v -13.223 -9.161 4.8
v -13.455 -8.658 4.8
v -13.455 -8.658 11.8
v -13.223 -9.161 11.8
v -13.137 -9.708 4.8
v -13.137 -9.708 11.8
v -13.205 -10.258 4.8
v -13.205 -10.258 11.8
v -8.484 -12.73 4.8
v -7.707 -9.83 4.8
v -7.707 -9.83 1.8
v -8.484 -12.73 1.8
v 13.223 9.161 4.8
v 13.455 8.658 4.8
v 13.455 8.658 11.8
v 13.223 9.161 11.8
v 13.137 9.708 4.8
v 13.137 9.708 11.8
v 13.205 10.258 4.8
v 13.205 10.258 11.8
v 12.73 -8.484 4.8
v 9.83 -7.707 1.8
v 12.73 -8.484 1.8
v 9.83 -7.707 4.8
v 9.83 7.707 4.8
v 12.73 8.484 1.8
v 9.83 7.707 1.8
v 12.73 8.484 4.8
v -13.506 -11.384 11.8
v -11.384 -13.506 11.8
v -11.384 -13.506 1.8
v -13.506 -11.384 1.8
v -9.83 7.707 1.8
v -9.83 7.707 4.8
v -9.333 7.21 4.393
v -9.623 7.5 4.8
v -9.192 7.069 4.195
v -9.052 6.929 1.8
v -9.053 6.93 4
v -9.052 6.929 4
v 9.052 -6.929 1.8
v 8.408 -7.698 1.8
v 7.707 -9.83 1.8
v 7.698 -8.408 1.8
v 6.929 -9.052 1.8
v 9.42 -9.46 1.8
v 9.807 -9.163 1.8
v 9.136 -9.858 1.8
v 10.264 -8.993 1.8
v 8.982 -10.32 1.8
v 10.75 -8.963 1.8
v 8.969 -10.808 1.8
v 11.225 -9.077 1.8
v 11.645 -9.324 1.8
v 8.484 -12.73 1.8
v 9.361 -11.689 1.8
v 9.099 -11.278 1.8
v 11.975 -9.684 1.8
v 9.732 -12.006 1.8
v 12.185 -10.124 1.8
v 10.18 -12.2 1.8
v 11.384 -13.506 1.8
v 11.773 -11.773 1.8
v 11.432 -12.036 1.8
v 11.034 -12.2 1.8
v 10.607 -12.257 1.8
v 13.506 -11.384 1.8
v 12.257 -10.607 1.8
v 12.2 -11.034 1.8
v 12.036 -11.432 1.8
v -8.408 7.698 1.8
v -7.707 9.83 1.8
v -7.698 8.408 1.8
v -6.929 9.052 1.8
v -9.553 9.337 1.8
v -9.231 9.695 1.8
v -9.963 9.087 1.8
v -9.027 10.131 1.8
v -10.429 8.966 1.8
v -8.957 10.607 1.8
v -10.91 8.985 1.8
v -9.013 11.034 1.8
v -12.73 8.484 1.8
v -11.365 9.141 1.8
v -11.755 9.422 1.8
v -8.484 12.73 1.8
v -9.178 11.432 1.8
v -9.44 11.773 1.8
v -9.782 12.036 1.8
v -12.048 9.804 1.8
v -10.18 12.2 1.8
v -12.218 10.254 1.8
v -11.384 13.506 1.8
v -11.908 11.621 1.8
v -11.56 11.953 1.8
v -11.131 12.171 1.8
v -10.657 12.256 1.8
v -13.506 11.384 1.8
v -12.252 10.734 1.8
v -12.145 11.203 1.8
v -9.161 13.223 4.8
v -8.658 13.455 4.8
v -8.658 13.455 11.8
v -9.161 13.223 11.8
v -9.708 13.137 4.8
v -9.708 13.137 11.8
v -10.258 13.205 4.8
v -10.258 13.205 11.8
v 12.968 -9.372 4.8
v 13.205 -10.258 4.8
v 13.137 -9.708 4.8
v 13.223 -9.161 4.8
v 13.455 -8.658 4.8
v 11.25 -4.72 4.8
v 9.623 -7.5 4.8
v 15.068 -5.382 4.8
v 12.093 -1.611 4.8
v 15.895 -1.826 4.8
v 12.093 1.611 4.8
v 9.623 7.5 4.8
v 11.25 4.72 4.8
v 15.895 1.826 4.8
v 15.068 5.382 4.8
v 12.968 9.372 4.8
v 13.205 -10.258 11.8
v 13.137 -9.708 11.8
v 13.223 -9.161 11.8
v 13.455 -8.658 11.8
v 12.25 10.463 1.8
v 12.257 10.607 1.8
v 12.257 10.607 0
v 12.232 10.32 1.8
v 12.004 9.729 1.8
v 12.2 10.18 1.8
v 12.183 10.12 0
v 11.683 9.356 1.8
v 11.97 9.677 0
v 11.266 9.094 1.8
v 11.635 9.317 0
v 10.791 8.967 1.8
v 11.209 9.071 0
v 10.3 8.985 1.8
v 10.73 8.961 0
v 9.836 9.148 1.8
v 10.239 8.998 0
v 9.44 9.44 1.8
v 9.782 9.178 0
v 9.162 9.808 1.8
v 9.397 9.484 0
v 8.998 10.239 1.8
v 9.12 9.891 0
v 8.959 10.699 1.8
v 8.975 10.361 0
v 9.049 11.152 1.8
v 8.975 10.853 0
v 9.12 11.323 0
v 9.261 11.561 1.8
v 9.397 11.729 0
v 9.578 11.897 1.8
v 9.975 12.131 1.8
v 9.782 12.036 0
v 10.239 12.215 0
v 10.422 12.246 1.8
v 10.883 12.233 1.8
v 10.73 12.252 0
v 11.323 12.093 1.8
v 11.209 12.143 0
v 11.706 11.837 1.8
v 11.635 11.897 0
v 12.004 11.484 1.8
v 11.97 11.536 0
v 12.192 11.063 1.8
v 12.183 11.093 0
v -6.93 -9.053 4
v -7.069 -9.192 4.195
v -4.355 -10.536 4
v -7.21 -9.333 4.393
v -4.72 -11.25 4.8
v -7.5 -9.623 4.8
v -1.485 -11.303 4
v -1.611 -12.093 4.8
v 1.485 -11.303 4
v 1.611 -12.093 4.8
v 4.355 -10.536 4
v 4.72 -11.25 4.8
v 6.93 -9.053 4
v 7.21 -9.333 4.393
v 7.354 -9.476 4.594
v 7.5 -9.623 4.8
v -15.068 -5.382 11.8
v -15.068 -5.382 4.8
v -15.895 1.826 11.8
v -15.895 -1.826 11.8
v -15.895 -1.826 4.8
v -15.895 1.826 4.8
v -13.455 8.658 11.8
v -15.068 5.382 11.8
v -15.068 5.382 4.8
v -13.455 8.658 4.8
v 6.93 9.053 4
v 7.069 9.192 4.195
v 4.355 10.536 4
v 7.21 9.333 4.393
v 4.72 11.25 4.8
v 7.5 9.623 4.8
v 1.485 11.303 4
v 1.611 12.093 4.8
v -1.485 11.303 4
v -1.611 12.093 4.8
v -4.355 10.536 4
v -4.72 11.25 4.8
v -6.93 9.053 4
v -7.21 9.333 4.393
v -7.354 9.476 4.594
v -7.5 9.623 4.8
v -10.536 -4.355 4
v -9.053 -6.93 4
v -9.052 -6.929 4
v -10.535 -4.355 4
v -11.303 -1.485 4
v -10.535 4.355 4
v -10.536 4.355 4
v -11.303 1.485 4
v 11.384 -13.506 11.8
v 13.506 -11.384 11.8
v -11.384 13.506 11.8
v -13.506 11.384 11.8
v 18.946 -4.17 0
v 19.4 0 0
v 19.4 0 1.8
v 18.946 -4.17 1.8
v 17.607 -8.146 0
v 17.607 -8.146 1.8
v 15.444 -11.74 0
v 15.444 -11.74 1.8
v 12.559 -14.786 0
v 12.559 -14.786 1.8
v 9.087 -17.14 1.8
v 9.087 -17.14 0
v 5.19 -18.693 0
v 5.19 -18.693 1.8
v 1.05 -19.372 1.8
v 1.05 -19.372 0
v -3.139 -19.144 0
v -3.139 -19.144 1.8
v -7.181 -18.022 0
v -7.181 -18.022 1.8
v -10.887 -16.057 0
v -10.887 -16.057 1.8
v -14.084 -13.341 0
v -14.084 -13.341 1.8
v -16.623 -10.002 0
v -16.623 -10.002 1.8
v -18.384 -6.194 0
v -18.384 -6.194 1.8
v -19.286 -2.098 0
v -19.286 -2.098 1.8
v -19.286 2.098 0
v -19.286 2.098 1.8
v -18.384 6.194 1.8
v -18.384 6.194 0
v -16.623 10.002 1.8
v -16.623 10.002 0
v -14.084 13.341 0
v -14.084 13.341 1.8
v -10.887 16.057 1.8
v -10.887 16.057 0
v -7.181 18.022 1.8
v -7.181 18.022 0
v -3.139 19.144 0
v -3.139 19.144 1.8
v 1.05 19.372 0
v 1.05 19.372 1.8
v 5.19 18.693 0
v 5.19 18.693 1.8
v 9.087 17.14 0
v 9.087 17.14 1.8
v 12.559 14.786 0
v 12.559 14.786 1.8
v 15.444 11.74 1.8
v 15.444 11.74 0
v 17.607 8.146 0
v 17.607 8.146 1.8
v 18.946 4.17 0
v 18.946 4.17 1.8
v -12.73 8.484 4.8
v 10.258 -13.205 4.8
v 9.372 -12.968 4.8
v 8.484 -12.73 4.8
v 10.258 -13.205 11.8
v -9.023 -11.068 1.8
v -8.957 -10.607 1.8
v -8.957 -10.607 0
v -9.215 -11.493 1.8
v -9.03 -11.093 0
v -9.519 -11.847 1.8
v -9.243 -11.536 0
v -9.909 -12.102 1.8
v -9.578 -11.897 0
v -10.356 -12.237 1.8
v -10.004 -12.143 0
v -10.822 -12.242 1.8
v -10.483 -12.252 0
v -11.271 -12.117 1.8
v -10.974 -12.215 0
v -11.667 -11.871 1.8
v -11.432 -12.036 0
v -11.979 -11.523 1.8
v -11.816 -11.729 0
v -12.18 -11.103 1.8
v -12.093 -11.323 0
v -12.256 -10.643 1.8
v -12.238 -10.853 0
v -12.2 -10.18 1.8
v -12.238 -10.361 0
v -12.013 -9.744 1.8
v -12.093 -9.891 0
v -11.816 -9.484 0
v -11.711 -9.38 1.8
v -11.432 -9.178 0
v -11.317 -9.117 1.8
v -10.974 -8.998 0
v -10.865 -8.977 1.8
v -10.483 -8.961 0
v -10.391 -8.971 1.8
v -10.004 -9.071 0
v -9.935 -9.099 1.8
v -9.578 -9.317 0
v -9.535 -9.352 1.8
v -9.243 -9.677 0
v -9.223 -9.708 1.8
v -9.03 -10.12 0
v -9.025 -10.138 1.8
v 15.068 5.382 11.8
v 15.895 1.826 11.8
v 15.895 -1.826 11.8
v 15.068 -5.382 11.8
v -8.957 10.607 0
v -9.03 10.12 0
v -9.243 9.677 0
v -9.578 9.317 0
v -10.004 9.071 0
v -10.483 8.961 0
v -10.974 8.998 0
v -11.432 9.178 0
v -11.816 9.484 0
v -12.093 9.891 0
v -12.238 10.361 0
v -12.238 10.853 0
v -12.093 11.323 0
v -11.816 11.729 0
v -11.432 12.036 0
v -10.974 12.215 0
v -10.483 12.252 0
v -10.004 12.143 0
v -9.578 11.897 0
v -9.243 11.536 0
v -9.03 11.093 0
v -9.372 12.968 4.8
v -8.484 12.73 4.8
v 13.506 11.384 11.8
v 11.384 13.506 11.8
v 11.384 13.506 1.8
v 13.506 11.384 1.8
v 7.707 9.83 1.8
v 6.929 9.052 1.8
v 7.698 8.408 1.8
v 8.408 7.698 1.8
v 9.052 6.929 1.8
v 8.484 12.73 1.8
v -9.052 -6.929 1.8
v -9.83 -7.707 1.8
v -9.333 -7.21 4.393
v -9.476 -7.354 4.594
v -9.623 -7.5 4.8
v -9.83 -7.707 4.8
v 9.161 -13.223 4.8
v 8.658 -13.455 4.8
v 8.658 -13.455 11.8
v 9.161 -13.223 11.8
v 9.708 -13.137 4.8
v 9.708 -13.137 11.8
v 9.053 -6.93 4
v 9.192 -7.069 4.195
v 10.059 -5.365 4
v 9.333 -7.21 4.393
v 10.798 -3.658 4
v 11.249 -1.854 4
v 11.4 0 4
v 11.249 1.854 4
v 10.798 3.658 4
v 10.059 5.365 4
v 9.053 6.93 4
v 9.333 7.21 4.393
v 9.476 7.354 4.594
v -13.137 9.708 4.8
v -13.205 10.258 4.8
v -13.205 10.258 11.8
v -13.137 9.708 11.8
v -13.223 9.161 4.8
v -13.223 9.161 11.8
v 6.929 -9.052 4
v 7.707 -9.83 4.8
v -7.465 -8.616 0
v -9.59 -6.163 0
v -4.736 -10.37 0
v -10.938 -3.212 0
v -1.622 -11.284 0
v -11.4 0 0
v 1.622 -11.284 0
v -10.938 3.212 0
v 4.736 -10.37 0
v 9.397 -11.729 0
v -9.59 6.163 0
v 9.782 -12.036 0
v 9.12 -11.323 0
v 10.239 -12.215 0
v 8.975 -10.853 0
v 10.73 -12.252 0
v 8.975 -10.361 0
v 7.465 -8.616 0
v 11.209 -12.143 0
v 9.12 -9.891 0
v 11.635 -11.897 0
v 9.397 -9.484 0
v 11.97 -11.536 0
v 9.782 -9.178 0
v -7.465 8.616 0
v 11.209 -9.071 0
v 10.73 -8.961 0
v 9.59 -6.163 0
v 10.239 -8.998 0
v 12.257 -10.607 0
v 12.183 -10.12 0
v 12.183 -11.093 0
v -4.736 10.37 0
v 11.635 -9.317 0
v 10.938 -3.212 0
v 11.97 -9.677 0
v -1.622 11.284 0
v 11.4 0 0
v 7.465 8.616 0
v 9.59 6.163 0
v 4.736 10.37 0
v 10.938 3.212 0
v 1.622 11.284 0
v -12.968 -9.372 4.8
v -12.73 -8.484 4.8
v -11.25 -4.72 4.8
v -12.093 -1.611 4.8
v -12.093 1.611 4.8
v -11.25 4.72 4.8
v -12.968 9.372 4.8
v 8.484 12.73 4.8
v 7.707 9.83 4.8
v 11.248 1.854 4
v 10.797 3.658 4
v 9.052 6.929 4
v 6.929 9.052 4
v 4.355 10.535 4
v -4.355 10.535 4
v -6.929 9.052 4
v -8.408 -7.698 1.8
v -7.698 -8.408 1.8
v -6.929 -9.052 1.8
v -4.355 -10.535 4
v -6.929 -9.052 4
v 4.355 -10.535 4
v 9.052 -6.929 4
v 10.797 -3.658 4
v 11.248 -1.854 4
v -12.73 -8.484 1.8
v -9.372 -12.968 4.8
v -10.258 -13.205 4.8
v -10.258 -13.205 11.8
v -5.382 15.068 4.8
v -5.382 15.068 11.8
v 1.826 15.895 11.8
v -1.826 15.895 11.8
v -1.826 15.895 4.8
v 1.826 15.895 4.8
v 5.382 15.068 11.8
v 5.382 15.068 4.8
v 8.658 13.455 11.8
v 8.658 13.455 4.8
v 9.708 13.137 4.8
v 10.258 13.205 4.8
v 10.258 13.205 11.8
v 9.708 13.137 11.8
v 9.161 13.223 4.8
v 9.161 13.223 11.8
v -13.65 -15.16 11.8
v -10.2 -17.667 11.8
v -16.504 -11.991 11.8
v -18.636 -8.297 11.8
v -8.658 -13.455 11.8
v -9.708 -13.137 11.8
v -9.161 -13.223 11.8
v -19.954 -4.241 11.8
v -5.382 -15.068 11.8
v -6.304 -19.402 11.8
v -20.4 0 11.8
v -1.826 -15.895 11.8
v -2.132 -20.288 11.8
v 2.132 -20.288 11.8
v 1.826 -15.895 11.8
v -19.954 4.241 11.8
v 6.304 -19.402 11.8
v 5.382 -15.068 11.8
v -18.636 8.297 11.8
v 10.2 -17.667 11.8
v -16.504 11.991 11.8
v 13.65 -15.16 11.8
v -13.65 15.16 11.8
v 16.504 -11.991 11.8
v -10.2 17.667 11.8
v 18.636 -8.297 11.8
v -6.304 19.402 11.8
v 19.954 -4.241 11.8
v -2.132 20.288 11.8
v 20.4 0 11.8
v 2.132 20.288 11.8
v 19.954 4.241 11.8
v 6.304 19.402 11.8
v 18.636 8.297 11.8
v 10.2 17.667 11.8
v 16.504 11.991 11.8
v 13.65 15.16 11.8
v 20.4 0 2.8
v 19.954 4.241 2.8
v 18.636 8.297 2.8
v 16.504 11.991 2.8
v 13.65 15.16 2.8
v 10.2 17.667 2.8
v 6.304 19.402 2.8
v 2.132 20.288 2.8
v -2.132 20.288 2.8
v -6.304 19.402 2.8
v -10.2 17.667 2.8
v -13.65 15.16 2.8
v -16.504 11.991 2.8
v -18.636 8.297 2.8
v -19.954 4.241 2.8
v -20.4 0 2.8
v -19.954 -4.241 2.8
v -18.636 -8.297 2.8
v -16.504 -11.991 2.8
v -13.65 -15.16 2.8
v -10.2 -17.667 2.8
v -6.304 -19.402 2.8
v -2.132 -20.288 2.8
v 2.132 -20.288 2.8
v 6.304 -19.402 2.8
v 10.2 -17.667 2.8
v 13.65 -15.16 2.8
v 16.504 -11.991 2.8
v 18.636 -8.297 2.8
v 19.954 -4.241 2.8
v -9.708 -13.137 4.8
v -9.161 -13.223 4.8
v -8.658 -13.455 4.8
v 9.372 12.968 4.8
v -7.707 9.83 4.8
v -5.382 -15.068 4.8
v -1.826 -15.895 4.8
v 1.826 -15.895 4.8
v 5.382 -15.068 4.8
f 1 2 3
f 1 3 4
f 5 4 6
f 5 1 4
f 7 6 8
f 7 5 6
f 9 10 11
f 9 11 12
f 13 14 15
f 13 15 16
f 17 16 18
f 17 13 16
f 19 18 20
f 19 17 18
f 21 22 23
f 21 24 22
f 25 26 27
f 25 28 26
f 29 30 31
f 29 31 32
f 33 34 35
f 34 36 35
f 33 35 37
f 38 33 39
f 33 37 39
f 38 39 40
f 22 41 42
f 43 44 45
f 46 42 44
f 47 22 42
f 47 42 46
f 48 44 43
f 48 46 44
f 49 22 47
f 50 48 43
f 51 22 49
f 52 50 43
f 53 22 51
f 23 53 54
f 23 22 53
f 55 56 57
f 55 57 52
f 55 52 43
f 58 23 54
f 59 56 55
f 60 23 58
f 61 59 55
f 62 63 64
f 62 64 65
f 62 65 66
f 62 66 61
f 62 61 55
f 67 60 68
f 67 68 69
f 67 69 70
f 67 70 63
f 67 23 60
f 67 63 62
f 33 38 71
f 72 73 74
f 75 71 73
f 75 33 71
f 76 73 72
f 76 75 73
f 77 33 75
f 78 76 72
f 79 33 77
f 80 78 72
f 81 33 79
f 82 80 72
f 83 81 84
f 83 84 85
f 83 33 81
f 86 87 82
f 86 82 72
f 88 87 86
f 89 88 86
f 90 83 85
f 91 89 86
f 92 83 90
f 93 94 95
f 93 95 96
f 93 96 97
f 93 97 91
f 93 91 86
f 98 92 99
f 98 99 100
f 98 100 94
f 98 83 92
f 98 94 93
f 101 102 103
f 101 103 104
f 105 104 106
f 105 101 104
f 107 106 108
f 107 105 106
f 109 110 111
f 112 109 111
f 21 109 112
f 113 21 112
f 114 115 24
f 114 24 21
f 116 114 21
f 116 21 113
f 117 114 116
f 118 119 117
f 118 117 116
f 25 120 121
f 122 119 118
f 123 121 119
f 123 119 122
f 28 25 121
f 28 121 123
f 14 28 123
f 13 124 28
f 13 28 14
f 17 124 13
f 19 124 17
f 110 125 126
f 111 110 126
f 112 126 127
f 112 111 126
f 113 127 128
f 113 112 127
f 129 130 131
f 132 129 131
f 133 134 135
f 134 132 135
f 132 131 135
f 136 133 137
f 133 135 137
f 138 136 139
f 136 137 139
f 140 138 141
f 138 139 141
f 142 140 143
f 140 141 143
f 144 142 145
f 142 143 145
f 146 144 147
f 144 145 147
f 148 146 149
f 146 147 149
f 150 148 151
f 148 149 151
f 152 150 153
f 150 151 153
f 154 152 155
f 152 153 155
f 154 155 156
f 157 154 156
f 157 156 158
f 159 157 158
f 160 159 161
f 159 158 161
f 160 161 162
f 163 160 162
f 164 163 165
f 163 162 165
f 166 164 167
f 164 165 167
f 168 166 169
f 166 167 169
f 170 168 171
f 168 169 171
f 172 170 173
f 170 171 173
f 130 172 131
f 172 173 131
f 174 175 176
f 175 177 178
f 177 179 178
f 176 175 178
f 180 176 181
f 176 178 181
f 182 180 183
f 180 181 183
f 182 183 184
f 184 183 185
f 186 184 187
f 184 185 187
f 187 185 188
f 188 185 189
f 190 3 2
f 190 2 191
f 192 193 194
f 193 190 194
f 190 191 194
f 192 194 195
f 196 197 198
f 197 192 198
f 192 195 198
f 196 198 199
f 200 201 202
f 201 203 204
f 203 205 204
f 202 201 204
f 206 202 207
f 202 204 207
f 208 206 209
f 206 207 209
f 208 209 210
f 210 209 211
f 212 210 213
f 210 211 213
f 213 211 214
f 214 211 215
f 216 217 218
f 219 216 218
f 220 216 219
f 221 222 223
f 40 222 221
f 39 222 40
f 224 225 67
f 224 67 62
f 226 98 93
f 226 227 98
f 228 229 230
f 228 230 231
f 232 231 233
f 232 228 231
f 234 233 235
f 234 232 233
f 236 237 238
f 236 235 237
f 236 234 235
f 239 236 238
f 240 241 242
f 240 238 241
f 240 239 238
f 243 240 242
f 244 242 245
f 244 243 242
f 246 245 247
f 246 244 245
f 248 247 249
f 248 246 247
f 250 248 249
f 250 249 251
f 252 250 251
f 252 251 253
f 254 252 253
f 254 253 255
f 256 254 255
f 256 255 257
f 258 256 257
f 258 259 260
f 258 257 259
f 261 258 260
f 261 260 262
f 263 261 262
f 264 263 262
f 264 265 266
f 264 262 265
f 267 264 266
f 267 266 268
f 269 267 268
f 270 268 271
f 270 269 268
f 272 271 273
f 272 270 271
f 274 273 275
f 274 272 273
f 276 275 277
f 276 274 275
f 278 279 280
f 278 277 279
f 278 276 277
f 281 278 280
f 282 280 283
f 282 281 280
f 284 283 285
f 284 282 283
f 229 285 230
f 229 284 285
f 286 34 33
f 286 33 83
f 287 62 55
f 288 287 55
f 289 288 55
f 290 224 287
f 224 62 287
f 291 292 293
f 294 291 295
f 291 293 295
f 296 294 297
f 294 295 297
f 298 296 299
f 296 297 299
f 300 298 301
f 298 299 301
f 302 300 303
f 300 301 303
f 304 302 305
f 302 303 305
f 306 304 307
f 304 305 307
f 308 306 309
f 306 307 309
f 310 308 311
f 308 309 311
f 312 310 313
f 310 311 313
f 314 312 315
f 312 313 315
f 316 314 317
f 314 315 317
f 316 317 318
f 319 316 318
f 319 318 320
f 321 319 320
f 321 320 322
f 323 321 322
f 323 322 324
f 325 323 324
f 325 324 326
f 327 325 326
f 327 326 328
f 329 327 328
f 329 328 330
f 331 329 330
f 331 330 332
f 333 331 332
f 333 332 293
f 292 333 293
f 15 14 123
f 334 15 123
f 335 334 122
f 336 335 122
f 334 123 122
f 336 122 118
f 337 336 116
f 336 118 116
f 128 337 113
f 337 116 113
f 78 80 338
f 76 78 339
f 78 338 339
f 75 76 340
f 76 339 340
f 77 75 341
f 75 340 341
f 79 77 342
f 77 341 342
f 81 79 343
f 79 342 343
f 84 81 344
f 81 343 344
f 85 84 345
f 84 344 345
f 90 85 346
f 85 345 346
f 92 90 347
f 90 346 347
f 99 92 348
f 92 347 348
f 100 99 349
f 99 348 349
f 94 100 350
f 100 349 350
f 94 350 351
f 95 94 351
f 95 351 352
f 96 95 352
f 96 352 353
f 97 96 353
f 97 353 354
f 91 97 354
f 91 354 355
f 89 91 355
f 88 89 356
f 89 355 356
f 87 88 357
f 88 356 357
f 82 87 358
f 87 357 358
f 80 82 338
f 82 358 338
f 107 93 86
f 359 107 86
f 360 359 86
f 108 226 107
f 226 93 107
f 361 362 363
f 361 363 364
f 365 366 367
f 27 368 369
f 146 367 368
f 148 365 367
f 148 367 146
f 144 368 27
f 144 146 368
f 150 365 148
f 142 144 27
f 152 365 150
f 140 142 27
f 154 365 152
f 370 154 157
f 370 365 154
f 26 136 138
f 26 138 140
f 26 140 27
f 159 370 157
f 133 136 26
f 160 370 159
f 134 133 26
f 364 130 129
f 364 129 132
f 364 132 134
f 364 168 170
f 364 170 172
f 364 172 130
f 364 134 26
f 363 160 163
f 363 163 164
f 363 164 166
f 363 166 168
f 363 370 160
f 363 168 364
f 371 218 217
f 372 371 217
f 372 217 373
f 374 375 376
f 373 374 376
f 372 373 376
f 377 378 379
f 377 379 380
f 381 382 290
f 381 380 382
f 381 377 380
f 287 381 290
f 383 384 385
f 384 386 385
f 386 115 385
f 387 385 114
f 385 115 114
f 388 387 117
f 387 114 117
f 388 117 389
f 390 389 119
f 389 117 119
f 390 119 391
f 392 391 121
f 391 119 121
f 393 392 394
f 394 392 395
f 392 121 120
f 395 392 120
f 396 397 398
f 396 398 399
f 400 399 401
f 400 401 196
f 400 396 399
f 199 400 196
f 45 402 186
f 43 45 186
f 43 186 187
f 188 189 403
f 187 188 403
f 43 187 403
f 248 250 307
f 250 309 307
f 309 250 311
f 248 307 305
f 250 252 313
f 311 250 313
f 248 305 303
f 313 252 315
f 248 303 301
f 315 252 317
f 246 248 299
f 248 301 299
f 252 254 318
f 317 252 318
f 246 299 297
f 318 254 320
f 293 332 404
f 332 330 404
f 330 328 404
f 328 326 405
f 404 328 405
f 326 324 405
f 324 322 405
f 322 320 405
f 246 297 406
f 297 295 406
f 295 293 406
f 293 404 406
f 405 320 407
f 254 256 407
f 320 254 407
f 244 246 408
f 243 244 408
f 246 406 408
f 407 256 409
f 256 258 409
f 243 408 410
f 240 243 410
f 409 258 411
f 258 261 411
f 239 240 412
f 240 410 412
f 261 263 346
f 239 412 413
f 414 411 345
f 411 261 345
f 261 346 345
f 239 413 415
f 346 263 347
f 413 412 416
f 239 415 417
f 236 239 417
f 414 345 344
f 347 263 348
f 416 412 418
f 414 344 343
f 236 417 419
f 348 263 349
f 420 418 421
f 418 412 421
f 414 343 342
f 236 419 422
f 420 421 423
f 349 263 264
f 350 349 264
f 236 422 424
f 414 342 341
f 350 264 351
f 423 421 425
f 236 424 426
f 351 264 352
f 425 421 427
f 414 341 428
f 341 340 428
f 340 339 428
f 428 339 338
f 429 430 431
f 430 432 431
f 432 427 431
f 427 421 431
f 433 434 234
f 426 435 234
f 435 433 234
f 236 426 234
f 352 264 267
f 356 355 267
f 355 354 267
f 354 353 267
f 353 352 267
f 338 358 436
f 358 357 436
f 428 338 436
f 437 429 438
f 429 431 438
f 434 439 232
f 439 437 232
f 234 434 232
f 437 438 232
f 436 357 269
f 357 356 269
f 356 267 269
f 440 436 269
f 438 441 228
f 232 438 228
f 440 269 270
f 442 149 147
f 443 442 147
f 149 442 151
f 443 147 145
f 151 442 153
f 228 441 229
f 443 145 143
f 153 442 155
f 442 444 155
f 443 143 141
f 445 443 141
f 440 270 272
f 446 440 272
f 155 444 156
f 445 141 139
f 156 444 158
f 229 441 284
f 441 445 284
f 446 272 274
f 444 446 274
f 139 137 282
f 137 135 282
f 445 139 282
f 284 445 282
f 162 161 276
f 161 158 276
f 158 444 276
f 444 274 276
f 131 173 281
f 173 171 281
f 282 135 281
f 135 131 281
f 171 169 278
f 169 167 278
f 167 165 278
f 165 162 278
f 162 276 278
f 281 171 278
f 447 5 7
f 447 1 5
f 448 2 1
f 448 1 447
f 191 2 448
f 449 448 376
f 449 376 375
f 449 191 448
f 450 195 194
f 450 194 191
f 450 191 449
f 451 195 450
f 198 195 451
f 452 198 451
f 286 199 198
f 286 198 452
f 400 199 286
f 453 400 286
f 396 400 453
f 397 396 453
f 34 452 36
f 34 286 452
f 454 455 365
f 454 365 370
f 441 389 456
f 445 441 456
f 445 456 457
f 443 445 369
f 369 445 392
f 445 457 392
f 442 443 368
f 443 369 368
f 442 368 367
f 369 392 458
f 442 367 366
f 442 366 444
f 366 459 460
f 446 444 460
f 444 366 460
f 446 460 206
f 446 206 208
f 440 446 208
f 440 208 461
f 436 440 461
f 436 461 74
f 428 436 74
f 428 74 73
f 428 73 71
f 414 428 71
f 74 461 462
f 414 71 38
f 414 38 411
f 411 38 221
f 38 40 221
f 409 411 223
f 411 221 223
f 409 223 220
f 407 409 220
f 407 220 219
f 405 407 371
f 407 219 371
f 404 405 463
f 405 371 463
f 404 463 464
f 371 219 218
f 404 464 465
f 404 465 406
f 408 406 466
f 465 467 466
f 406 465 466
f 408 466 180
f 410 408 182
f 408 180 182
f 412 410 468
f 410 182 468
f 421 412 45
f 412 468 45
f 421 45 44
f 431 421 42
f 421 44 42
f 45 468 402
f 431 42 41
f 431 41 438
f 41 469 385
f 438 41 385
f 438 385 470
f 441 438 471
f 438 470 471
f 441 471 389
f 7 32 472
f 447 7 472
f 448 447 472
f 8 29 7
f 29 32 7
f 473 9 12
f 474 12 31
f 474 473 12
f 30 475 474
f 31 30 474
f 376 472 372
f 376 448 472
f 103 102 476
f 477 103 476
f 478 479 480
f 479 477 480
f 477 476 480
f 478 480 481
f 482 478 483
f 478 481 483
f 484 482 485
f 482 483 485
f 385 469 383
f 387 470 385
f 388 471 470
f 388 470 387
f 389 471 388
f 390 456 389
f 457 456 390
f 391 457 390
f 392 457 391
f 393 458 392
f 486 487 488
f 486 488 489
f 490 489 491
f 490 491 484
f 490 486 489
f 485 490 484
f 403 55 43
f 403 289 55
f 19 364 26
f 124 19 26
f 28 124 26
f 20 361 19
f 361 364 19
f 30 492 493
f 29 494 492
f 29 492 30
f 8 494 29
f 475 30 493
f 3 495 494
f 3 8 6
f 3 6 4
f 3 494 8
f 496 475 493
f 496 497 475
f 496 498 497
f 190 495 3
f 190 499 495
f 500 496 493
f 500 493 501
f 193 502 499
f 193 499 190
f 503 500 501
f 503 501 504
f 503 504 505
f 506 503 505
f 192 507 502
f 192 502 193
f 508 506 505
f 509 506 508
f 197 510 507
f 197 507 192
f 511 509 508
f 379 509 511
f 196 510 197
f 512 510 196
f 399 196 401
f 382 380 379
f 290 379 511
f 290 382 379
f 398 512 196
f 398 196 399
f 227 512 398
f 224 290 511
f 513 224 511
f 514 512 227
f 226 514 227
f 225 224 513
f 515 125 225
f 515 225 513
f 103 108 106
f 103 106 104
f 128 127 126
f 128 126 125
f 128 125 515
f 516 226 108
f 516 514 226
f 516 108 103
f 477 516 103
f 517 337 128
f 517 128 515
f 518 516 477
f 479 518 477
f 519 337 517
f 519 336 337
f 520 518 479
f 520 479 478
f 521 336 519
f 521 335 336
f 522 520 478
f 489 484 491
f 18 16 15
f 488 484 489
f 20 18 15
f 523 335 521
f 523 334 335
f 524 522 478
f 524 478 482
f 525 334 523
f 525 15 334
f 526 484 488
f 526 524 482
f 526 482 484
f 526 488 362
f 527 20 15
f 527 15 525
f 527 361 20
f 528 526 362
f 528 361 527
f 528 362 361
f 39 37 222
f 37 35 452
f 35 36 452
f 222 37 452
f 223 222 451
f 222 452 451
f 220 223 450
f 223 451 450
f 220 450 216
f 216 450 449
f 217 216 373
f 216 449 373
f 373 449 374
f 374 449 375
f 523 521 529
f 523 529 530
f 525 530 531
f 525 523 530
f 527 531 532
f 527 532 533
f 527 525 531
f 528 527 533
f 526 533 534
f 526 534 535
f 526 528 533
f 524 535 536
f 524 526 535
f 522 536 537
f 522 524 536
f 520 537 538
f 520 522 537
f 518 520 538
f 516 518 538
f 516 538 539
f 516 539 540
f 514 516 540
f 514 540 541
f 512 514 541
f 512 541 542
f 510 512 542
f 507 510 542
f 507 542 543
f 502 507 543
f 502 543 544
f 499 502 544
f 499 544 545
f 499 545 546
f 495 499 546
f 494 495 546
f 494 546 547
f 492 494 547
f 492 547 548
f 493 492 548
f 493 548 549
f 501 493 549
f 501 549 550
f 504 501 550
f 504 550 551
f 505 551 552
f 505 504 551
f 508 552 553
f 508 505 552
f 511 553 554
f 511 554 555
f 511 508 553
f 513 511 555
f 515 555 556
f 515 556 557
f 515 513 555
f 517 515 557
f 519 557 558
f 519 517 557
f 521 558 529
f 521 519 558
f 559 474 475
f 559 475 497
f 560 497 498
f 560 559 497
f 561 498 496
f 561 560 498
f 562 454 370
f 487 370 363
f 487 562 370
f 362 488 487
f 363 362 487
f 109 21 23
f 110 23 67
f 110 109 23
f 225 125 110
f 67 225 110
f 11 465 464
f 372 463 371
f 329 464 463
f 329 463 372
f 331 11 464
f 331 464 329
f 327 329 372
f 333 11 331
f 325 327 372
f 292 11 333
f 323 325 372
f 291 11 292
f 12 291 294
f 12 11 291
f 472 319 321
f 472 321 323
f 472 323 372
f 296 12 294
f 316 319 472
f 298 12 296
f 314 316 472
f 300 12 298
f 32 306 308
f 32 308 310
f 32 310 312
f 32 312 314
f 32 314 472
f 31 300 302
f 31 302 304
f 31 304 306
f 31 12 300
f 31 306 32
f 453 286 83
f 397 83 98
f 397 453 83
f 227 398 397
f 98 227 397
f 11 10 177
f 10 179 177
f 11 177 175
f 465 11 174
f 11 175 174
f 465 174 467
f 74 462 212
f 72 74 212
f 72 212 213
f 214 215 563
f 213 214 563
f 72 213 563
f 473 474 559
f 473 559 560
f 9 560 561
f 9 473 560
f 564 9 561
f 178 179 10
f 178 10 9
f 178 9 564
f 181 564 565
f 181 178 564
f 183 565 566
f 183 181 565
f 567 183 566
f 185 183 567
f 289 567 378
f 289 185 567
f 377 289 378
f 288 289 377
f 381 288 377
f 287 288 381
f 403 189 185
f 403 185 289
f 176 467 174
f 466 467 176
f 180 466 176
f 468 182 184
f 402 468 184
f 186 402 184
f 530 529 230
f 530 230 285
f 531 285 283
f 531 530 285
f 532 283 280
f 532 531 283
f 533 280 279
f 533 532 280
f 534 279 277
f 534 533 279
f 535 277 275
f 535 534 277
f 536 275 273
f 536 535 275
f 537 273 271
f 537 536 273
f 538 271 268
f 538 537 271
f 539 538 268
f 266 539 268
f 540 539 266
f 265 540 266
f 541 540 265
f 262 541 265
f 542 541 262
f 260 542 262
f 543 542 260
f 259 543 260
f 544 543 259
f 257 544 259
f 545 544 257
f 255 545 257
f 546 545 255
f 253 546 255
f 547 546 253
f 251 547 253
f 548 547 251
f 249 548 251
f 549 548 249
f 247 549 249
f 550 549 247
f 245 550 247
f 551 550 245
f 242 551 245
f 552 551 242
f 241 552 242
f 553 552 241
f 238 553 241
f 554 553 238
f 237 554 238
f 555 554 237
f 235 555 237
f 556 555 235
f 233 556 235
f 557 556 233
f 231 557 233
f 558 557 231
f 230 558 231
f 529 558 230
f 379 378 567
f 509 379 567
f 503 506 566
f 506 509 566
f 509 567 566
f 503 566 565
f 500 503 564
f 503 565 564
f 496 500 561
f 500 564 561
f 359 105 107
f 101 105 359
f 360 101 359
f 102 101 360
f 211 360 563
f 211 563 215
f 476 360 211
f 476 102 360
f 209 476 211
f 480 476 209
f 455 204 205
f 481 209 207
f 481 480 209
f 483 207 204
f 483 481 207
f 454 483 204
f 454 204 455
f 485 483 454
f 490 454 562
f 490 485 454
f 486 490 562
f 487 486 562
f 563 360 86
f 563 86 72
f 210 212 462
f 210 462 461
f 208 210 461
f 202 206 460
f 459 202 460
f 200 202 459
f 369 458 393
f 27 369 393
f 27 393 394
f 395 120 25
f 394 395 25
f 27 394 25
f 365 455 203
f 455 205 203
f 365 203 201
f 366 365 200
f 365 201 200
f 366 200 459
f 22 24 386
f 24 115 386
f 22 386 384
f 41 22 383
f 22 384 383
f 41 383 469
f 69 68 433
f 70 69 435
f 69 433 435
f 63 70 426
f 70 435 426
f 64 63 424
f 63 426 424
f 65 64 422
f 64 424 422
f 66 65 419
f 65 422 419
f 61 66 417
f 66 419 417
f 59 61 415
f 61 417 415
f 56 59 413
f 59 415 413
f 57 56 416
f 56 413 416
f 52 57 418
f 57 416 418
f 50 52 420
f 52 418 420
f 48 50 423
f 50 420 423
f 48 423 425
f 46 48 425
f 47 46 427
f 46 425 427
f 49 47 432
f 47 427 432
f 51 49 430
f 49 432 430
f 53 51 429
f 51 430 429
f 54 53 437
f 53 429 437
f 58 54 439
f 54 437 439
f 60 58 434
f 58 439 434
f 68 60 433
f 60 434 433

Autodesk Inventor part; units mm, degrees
ref_plane "YZ Plane" through (0, 0, 0) normal (1, 0, 0) x (0, 1, 0)
ref_plane "XZ Plane" through (0, 0, 0) normal (0, 1, 0) x (-1, 0, 0)
ref_plane "XY Plane" through (0, 0, 0) normal (0, 0, 1) x (1, 0, 0)
sketch "스케치1" plane through (0, 0, 0) normal (0, 0, 1) x (1, 0, 0)
  circle A0 centre (0, 0) radius 19.4
  circle A1 centre (10.6066, 10.6066) radius 1.65
  circle A2 centre (0, 0) radius 11
  circle A3 centre (-10.6066, 10.6066) radius 1.65
  circle A4 centre (-10.6066, -10.6066) radius 1.65
  circle A5 centre (10.6066, -10.6066) radius 1.65
  dimension "d1" = 22
  dimension "d5" = 360
extrude "돌출1" add sketch "스케치1" along normal blind 4.8
sketch "스케치2" plane through (0, 0, 4.8) normal (0, 0, 1) x (1, 0, 0)
  circle A0 centre (0, 0) radius 19.4 projected
  circle A1 centre (10.6066, -10.6066) radius 1.65 projected
  circle A2 centre (-10.6066, -10.6066) radius 1.65 projected
  circle A3 centre (-10.6066, 10.6066) radius 1.65 projected
  circle A4 centre (0, 0) radius 11 projected
  circle A5 centre (10.6066, 10.6066) radius 1.65 projected
  line L0 (10.6066, 10.6066) -> (8.8388, 8.8388)
  line L1 (10.6066, 10.6066) -> (13.1066, 10.6066) construction
  line L2 (7.8182, 9.8595) -> (8.5654, 12.6478)
  line L3 (8.5654, 12.6478) -> (11.3537, 13.395)
  line L4 (11.3537, 13.395) -> (13.395, 11.3537)
  line L5 (13.395, 11.3537) -> (12.6478, 8.5654)
  line L6 (12.6478, 8.5654) -> (9.8595, 7.8182)
  line L7 (9.8595, 7.8182) -> (7.8182, 9.8595)
  line L8 (-10.6066, 10.6066) -> (-10.6066, 13.1066) construction
  line L9 (-13.395, 11.3537) -> (-11.3537, 13.395)
  line L10 (-11.3537, 13.395) -> (-8.5654, 12.6478)
  line L11 (-8.5654, 12.6478) -> (-7.8182, 9.8595)
  line L12 (-7.8182, 9.8595) -> (-9.8595, 7.8182)
  line L13 (-12.6478, 8.5654) -> (-13.395, 11.3537)
  line L14 (-9.8595, 7.8182) -> (-12.6478, 8.5654)
  line L15 (-10.6066, -10.6066) -> (-13.1066, -10.6066) construction
  line L16 (-11.3537, -13.395) -> (-13.395, -11.3537)
  line L17 (-13.395, -11.3537) -> (-12.6478, -8.5654)
  line L18 (-12.6478, -8.5654) -> (-9.8595, -7.8182)
  line L19 (-9.8595, -7.8182) -> (-7.8182, -9.8595)
  line L20 (-8.5654, -12.6478) -> (-11.3537, -13.395)
  line L21 (-7.8182, -9.8595) -> (-8.5654, -12.6478)
  line L22 (10.6066, -10.6066) -> (10.6066, -13.1066) construction
  line L23 (13.395, -11.3537) -> (11.3537, -13.395)
  line L24 (11.3537, -13.395) -> (8.5654, -12.6478)
  line L25 (8.5654, -12.6478) -> (7.8182, -9.8595)
  line L26 (7.8182, -9.8595) -> (9.8595, -7.8182)
  line L27 (12.6478, -8.5654) -> (13.395, -11.3537)
  line L28 (9.8595, -7.8182) -> (12.6478, -8.5654)
  point P0 (-8.8388, 8.8388)
  point P1 (-8.8388, -8.8388)
  point P2 (8.8388, -8.8388)
  dimension "d9" = 2.5
  dimension "d10" = 135
  dimension "d13" = 360
extrude "돌출2" cut sketch "스케치2" against normal blind 3 contours A1 | A2 | A3 | A5 | L7 L2 L3 L4 L5 L6 | L9 L10 L11 L12 L14 L13 | L16 L17 L18 L19 L21 L20 | L23 L24 L25 L26 L28 L27
sketch "스케치3" plane through (0, 0, 4.8) normal (0, 0, 1) x (1, 0, 0)
  circle A0 centre (0, 0) radius 16
  circle A1 centre (0, 0) radius 22.4
  line L0 (-7.8182, 9.8595) -> (-9.8595, 7.8182) projected
  line L1 (-9.8595, 7.8182) -> (-12.6478, 8.5654) projected
  line L2 (-12.6478, 8.5654) -> (-13.395, 11.3537) projected
  line L3 (-13.395, 11.3537) -> (-11.3537, 13.395) projected
  line L4 (-11.3537, 13.395) -> (-8.5654, 12.6478) projected
  line L5 (-8.5654, 12.6478) -> (-7.8182, 9.8595) projected
  line L6 (-9.8595, -7.8182) -> (-7.8182, -9.8595) projected
  line L7 (-7.8182, -9.8595) -> (-8.5654, -12.6478) projected
  line L8 (-8.5654, -12.6478) -> (-11.3537, -13.395) projected
  line L9 (-11.3537, -13.395) -> (-13.395, -11.3537) projected
  line L10 (-13.395, -11.3537) -> (-12.6478, -8.5654) projected
  line L11 (-12.6478, -8.5654) -> (-9.8595, -7.8182) projected
  line L12 (13.395, 11.3537) -> (12.6478, 8.5654) projected
  line L13 (12.6478, 8.5654) -> (9.8595, 7.8182) projected
  line L14 (9.8595, 7.8182) -> (7.8182, 9.8595) projected
  line L15 (7.8182, 9.8595) -> (8.5654, 12.6478) projected
  line L16 (8.5654, 12.6478) -> (11.3537, 13.395) projected
  line L17 (11.3537, 13.395) -> (13.395, 11.3537) projected
  line L18 (7.8182, -9.8595) -> (9.8595, -7.8182) projected
  line L19 (9.8595, -7.8182) -> (12.6478, -8.5654) projected
  line L20 (12.6478, -8.5654) -> (13.395, -11.3537) projected
  line L21 (13.395, -11.3537) -> (11.3537, -13.395) projected
  line L22 (11.3537, -13.395) -> (8.5654, -12.6478) projected
  line L23 (8.5654, -12.6478) -> (7.8182, -9.8595) projected
  circle A2 centre (0, 0) radius 19.4 projected
  circle A3 centre (0, 0) radius 11 projected
  point P0 (-9.4762, 12.8919)
  point P1 (9.4762, 12.8919)
  point P2 (12.8919, 9.4762)
  point P3 (12.8919, -9.4762)
  point P4 (9.4762, -12.8919)
  point P5 (-9.4762, -12.8919)
  point P6 (-12.8919, -9.4762)
  point P7 (-12.8919, 9.4762)
  dimension "d17" = 32
  dimension "d18" = 6.4
extrude "돌출3" add sketch "스케치3" along normal blind 7 contours A1 | A2
chamfer "모따기1" distance 3 angle 45 1 edges at (-19.4, 0, 4.8)
sketch "스케치4" plane through (0, 0, 4.8) normal (0, 0, 1) x (1, 0, 0)
  circle A0 centre (0, 0) radius 11 projected
  arc A1 (12.8919, -9.4762) -> (12.8919, 9.4762) centre (0, 0) ccw projected
  line L0 (12.8919, 9.4762) -> (12.6478, 8.5654) projected
  line L1 (12.6478, 8.5654) -> (9.8595, 7.8182) projected
  line L2 (9.8595, 7.8182) -> (7.8182, 9.8595) projected
  line L3 (7.8182, 9.8595) -> (8.5654, 12.6478) projected
  line L4 (8.5654, 12.6478) -> (9.4762, 12.8919) projected
  arc A2 (9.4762, 12.8919) -> (-9.4762, 12.8919) centre (0, 0) ccw projected
  line L5 (-9.4762, 12.8919) -> (-8.5654, 12.6478) projected
  line L6 (-8.5654, 12.6478) -> (-7.8182, 9.8595) projected
  line L7 (-7.8182, 9.8595) -> (-9.8595, 7.8182) projected
  line L8 (-9.8595, 7.8182) -> (-12.6478, 8.5654) projected
  line L9 (-12.6478, 8.5654) -> (-12.8919, 9.4762) projected
  arc A3 (-12.8919, 9.4762) -> (-12.8919, -9.4762) centre (0, 0) ccw projected
  line L10 (-12.8919, -9.4762) -> (-12.6478, -8.5654) projected
  line L11 (-12.6478, -8.5654) -> (-9.8595, -7.8182) projected
  line L12 (-9.8595, -7.8182) -> (-7.8182, -9.8595) projected
  line L13 (-7.8182, -9.8595) -> (-8.5654, -12.6478) projected
  line L14 (-8.5654, -12.6478) -> (-9.4762, -12.8919) projected
  arc A4 (-9.4762, -12.8919) -> (9.4762, -12.8919) centre (0, 0) ccw projected
  line L15 (9.4762, -12.8919) -> (8.5654, -12.6478) projected
  line L16 (8.5654, -12.6478) -> (7.8182, -9.8595) projected
  line L17 (7.8182, -9.8595) -> (9.8595, -7.8182) projected
  line L18 (9.8595, -7.8182) -> (12.6478, -8.5654) projected
  line L19 (12.6478, -8.5654) -> (12.8919, -9.4762) projected
  circle A5 centre (0, 0) radius 11.4
  line L20 (9.8595, 7.8182) -> (9.0168, 6.9755)
  line L21 (8.8388, 8.8388) -> (8.4116, 8.4116)
  line L22 (7.8182, 9.8595) -> (6.9755, 9.0168)
  line L23 (-7.8182, 9.8595) -> (-6.9755, 9.0168)
  line L24 (-9.8595, 7.8182) -> (-9.0168, 6.9755)
  line L25 (-9.8595, -7.8182) -> (-9.0168, -6.9755)
  line L26 (-7.8182, -9.8595) -> (-6.9755, -9.0168)
  line L27 (7.8182, -9.8595) -> (6.9755, -9.0168)
  line L28 (9.8595, -7.8182) -> (9.0168, -6.9755)
  dimension "d24" = 0.4
  dimension "d27" = 360
extrude "돌출4" cut sketch "스케치4" against normal blind 7 contours A5
extrude "돌출5" cut sketch "스케치4" against normal up to surface (3 mm away) contours L17 L27 A5 L28 | L20 A5 L22 L2 | L26 L12 L25 A5 | A5 L24 L7 L23
sketch "스케치5" plane through (0, 0, 11.8) normal (0, 0, 1) x (1, 0, 0)
  circle A0 centre (0, 0) radius 22.4 projected
  circle A1 centre (0, 0) radius 20.4
  dimension "d33" = 2
extrude "돌출6" cut sketch "스케치5" against normal blind 10
sketch "스케치6" plane through (0, 0, 4.8) normal (0, 0, 1) x (1, 0, 0)
  circle A0 centre (0, 0) radius 12.2
  dimension "d36" = 24.4
extrude "돌출7" cut sketch "스케치6" against normal blind 0.8
chamfer "모따기2" distance 0.8 angle 45 4 edges at (12.2, 0, 4) (0, -12.2, 4) (0, 12.2, 4) (-12.2, 0, 4)
sketch "스케치7" plane through (0, 0, 11.8) normal (0, 0, 1) x (1, 0, 0)
  circle A0 centre (0, 0) radius 20.4 projected
  line L0 (-13.395, 11.3537) -> (-11.3537, 13.395) projected
  line L1 (-11.3537, 13.395) -> (-9.4762, 12.8919) projected
  arc A1 (9.4762, 12.8919) -> (-9.4762, 12.8919) centre (0, 0) ccw projected
  line L2 (9.4762, 12.8919) -> (11.3537, 13.395) projected
  line L3 (11.3537, 13.395) -> (13.395, 11.3537) projected
  line L4 (13.395, 11.3537) -> (12.8919, 9.4762) projected
  arc A2 (12.8919, -9.4762) -> (12.8919, 9.4762) centre (0, 0) ccw projected
  line L5 (12.8919, -9.4762) -> (13.395, -11.3537) projected
  line L6 (13.395, -11.3537) -> (11.3537, -13.395) projected
  line L7 (11.3537, -13.395) -> (9.4762, -12.8919) projected
  arc A3 (-9.4762, -12.8919) -> (9.4762, -12.8919) centre (0, 0) ccw projected
  line L8 (-9.4762, -12.8919) -> (-11.3537, -13.395) projected
  line L9 (-11.3537, -13.395) -> (-13.395, -11.3537) projected
  line L10 (-13.395, -11.3537) -> (-12.8919, -9.4762) projected
  arc A4 (-12.8919, 9.4762) -> (-12.8919, -9.4762) centre (0, 0) ccw projected
  line L11 (-12.8919, 9.4762) -> (-13.395, 11.3537) projected
  circle A5 centre (10.6066, 10.6066) radius 1.65 projected
  line L12 (10.6066, 10.6066) -> (13.118, 9.9337)
  line L13 (12.7295, 8.4837) -> (9.8296, 7.7067)
  line L14 (7.7067, 9.8296) -> (8.4837, 12.7295)
  line L15 (8.4837, 12.7295) -> (11.3836, 13.5065)
  line L16 (11.3836, 13.5065) -> (13.5065, 11.3836)
  line L17 (13.5065, 11.3836) -> (12.7295, 8.4837)
  line L18 (7.7067, 9.8296) -> (6.6452, 8.7681)
  line L19 (6.6452, 8.7681) -> (8.7681, 6.6452)
  line L20 (8.7681, 6.6452) -> (9.8296, 7.7067)
  point P0 (9.3724, 12.9676)
  point P1 (12.9676, 9.3724)
  dimension "d42" = 2.6
extrude "돌출8" cut sketch "스케치7" against normal up to surface (10 mm away) contours L15 L16 L17 L12 L4 L3 L2 A1 | A1 L2 L3 L4 A2 L17 L13 L20 L19 L18 L14 L15 | L17 A2 L4 L12
pattern_circular "원형 패턴1" count 4 over 360 about axis through (0, 0, 4.8) along (0, 0, -1) of "돌출8"
fillet "모깎기1" radius 2 8 edges at (12.9676, 9.3724, 8.3) (9.3724, 12.9676, 8.3) (12.9676, -9.3724, 8.3) (9.3724, -12.9676, 8.3) (-9.3724, -12.9676, 8.3) (-12.9676, -9.3724, 8.3) (-12.9676, 9.3724, 8.3) (-9.3724, 12.9676, 8.3)
properties part number "ShaftLock_B"
